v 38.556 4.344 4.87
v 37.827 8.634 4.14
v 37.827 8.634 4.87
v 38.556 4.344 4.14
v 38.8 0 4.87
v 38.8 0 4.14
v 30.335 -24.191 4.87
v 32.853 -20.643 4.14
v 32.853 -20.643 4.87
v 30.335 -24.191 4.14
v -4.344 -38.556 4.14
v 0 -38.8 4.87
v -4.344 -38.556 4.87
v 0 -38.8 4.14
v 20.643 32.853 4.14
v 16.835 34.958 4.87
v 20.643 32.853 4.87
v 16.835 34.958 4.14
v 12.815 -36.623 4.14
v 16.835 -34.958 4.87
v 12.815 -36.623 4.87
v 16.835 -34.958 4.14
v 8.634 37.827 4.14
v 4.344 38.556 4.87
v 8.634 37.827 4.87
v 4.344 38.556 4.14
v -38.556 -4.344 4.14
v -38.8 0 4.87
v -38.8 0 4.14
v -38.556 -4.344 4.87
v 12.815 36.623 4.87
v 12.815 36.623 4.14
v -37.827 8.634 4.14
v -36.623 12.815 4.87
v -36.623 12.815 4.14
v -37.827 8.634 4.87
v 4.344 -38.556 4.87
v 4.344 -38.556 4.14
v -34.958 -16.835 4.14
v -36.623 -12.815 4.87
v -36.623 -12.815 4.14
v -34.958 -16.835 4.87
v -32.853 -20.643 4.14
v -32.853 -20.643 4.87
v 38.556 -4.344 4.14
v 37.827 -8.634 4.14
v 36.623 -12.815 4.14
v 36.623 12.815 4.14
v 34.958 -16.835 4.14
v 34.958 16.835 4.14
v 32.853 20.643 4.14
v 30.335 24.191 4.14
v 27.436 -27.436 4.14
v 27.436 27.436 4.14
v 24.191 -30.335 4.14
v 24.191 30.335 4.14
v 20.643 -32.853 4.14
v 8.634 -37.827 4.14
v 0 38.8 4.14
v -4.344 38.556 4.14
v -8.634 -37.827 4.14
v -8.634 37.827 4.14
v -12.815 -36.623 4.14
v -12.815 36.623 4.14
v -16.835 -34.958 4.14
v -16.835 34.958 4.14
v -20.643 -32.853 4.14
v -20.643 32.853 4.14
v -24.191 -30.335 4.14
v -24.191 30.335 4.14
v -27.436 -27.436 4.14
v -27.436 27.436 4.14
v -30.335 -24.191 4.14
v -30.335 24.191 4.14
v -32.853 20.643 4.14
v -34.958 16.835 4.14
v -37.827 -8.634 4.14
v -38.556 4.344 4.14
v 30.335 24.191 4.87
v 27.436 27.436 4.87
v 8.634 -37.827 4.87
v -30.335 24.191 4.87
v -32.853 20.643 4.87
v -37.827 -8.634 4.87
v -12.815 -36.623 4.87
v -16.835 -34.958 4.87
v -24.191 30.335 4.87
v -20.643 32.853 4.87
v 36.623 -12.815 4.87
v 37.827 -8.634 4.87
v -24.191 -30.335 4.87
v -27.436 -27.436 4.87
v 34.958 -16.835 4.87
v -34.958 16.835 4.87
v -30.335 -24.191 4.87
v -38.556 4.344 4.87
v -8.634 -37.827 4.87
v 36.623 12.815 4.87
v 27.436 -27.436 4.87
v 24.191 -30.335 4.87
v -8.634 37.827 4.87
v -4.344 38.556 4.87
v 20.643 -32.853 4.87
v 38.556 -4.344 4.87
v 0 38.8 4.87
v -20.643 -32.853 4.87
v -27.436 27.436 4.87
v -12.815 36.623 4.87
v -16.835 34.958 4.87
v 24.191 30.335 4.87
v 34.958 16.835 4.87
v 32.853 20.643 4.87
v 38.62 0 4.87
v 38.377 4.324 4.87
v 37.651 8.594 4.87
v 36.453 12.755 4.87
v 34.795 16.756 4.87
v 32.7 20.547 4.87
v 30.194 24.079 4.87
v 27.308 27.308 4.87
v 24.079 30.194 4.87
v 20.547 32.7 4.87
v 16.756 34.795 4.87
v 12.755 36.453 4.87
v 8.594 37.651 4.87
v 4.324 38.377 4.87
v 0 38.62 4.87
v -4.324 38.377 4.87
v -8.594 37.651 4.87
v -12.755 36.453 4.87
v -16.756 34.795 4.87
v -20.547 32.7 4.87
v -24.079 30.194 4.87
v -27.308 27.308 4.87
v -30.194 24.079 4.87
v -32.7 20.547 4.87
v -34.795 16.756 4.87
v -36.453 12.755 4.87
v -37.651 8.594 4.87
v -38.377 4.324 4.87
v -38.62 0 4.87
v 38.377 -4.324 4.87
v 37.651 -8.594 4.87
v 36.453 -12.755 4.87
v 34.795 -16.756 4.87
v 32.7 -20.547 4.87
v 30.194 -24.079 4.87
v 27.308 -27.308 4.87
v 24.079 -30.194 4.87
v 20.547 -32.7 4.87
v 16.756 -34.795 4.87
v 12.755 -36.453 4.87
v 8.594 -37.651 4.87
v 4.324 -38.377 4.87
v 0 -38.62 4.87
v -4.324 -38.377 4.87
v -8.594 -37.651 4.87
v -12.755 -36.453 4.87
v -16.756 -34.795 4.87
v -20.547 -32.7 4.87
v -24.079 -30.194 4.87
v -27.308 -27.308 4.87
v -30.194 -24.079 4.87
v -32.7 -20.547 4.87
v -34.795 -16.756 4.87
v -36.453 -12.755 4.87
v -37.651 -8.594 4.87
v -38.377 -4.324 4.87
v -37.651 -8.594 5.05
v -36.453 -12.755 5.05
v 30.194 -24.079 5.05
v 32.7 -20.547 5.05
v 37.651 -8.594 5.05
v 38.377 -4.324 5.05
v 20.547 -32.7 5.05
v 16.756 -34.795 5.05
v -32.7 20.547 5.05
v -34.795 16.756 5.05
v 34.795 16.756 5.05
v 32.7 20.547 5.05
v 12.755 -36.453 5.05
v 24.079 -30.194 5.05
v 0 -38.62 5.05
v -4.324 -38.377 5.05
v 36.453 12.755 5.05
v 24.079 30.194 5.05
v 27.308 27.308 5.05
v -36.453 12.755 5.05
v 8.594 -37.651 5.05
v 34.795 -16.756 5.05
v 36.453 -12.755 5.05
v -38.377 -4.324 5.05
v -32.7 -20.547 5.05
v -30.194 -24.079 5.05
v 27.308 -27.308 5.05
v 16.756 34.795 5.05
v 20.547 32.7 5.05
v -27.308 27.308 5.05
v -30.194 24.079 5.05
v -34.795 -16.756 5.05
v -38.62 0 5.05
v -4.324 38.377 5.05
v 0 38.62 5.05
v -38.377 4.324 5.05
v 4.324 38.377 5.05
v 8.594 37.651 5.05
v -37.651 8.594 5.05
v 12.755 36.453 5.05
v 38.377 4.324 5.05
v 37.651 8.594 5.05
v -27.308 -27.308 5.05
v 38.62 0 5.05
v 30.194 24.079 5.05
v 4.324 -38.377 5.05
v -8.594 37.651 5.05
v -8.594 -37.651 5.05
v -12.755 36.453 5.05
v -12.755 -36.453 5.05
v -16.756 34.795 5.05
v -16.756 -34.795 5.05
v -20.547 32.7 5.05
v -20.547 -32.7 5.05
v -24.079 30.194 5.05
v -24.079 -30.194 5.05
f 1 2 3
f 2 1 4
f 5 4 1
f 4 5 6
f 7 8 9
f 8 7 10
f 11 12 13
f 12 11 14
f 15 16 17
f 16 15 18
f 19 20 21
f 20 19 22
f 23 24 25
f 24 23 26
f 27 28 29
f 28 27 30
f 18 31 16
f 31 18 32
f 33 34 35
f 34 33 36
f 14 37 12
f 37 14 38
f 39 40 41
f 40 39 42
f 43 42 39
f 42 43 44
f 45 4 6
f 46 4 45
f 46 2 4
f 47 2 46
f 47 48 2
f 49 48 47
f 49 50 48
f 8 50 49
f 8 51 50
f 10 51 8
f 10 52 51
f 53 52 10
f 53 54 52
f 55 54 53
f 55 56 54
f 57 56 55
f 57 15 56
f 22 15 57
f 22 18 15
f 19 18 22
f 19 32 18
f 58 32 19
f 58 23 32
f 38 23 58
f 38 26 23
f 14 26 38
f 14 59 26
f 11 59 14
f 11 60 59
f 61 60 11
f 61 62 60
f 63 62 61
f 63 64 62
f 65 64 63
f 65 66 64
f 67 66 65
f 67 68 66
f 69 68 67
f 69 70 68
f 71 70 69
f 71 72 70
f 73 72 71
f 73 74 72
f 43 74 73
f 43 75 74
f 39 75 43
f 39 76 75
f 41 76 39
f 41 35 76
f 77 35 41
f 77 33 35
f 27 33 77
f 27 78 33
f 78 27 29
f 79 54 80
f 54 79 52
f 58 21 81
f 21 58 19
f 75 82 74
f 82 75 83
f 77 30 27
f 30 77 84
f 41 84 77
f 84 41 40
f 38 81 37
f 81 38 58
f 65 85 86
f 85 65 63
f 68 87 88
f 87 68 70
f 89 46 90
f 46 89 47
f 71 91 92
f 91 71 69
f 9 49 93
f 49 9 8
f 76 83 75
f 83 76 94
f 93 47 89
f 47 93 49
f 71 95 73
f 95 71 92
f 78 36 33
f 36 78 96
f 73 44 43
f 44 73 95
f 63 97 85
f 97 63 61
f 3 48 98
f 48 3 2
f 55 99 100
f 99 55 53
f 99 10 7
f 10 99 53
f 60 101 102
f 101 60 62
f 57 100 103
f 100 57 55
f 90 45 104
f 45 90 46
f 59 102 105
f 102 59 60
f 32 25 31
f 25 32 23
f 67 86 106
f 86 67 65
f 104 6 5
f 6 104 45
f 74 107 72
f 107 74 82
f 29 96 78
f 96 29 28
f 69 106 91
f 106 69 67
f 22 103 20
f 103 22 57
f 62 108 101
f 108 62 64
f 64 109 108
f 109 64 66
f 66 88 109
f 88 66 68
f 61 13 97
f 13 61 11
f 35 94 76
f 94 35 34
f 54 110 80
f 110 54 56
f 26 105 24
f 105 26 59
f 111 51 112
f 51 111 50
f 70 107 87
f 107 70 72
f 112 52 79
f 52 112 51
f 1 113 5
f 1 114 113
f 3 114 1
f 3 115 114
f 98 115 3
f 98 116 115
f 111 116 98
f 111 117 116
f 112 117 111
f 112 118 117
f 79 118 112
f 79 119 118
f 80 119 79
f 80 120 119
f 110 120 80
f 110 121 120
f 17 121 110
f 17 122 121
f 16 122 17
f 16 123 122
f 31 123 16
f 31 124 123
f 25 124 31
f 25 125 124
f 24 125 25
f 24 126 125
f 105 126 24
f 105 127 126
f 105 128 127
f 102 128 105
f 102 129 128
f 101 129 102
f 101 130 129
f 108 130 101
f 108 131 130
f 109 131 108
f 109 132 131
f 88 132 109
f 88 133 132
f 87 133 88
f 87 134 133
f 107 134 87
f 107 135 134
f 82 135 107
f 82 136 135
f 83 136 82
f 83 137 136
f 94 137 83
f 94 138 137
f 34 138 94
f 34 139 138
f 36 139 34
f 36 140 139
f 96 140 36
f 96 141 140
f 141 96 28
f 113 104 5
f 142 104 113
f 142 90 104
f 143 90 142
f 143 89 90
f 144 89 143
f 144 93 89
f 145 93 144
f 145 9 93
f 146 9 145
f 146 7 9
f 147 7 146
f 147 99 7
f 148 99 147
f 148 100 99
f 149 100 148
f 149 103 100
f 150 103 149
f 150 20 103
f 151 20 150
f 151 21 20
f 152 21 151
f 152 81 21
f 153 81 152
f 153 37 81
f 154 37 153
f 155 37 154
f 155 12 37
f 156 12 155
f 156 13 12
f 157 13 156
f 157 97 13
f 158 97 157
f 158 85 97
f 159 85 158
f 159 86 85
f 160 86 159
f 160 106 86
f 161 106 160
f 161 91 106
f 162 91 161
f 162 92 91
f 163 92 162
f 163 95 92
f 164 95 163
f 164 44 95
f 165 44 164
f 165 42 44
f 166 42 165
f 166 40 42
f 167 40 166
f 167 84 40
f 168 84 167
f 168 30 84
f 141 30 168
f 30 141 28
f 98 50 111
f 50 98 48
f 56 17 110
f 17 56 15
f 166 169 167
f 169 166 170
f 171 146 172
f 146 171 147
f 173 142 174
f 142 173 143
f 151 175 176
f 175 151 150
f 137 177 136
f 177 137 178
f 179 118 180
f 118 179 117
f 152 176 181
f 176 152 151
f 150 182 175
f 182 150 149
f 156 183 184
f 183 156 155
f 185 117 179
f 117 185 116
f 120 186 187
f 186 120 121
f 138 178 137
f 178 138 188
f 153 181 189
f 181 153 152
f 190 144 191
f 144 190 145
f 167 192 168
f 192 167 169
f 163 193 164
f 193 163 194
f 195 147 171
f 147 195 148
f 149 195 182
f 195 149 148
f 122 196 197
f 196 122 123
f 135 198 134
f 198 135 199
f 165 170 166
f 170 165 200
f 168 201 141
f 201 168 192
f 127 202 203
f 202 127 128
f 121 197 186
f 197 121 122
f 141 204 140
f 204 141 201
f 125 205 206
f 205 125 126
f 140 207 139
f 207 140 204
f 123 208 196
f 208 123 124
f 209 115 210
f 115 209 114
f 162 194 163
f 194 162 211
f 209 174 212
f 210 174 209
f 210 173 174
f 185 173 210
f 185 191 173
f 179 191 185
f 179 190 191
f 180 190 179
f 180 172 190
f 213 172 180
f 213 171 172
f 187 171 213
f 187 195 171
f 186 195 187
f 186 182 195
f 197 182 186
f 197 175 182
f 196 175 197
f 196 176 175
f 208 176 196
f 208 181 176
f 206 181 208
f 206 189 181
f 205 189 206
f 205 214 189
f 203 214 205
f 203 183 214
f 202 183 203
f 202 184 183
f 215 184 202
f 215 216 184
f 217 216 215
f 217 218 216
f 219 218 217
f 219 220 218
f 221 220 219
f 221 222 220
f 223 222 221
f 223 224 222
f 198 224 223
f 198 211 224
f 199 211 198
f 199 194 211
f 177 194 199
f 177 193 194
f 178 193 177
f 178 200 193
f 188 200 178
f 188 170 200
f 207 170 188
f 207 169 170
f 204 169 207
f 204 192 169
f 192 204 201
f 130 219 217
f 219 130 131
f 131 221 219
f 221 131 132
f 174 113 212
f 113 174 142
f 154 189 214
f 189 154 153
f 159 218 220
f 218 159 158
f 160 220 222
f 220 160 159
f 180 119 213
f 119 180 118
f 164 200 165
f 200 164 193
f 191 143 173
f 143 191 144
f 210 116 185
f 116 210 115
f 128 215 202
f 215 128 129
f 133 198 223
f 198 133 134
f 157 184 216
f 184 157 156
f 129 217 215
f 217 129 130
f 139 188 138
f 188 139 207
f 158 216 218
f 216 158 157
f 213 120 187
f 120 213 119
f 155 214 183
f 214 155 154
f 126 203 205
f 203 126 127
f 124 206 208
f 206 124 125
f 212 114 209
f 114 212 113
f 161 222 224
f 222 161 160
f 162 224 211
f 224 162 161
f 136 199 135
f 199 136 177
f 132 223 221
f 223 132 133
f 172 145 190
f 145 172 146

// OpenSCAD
part_index_override = 3;
size_index_override = 0;
bail_index_override = 0;
include <../softball_A_chain_pendant.scad>
